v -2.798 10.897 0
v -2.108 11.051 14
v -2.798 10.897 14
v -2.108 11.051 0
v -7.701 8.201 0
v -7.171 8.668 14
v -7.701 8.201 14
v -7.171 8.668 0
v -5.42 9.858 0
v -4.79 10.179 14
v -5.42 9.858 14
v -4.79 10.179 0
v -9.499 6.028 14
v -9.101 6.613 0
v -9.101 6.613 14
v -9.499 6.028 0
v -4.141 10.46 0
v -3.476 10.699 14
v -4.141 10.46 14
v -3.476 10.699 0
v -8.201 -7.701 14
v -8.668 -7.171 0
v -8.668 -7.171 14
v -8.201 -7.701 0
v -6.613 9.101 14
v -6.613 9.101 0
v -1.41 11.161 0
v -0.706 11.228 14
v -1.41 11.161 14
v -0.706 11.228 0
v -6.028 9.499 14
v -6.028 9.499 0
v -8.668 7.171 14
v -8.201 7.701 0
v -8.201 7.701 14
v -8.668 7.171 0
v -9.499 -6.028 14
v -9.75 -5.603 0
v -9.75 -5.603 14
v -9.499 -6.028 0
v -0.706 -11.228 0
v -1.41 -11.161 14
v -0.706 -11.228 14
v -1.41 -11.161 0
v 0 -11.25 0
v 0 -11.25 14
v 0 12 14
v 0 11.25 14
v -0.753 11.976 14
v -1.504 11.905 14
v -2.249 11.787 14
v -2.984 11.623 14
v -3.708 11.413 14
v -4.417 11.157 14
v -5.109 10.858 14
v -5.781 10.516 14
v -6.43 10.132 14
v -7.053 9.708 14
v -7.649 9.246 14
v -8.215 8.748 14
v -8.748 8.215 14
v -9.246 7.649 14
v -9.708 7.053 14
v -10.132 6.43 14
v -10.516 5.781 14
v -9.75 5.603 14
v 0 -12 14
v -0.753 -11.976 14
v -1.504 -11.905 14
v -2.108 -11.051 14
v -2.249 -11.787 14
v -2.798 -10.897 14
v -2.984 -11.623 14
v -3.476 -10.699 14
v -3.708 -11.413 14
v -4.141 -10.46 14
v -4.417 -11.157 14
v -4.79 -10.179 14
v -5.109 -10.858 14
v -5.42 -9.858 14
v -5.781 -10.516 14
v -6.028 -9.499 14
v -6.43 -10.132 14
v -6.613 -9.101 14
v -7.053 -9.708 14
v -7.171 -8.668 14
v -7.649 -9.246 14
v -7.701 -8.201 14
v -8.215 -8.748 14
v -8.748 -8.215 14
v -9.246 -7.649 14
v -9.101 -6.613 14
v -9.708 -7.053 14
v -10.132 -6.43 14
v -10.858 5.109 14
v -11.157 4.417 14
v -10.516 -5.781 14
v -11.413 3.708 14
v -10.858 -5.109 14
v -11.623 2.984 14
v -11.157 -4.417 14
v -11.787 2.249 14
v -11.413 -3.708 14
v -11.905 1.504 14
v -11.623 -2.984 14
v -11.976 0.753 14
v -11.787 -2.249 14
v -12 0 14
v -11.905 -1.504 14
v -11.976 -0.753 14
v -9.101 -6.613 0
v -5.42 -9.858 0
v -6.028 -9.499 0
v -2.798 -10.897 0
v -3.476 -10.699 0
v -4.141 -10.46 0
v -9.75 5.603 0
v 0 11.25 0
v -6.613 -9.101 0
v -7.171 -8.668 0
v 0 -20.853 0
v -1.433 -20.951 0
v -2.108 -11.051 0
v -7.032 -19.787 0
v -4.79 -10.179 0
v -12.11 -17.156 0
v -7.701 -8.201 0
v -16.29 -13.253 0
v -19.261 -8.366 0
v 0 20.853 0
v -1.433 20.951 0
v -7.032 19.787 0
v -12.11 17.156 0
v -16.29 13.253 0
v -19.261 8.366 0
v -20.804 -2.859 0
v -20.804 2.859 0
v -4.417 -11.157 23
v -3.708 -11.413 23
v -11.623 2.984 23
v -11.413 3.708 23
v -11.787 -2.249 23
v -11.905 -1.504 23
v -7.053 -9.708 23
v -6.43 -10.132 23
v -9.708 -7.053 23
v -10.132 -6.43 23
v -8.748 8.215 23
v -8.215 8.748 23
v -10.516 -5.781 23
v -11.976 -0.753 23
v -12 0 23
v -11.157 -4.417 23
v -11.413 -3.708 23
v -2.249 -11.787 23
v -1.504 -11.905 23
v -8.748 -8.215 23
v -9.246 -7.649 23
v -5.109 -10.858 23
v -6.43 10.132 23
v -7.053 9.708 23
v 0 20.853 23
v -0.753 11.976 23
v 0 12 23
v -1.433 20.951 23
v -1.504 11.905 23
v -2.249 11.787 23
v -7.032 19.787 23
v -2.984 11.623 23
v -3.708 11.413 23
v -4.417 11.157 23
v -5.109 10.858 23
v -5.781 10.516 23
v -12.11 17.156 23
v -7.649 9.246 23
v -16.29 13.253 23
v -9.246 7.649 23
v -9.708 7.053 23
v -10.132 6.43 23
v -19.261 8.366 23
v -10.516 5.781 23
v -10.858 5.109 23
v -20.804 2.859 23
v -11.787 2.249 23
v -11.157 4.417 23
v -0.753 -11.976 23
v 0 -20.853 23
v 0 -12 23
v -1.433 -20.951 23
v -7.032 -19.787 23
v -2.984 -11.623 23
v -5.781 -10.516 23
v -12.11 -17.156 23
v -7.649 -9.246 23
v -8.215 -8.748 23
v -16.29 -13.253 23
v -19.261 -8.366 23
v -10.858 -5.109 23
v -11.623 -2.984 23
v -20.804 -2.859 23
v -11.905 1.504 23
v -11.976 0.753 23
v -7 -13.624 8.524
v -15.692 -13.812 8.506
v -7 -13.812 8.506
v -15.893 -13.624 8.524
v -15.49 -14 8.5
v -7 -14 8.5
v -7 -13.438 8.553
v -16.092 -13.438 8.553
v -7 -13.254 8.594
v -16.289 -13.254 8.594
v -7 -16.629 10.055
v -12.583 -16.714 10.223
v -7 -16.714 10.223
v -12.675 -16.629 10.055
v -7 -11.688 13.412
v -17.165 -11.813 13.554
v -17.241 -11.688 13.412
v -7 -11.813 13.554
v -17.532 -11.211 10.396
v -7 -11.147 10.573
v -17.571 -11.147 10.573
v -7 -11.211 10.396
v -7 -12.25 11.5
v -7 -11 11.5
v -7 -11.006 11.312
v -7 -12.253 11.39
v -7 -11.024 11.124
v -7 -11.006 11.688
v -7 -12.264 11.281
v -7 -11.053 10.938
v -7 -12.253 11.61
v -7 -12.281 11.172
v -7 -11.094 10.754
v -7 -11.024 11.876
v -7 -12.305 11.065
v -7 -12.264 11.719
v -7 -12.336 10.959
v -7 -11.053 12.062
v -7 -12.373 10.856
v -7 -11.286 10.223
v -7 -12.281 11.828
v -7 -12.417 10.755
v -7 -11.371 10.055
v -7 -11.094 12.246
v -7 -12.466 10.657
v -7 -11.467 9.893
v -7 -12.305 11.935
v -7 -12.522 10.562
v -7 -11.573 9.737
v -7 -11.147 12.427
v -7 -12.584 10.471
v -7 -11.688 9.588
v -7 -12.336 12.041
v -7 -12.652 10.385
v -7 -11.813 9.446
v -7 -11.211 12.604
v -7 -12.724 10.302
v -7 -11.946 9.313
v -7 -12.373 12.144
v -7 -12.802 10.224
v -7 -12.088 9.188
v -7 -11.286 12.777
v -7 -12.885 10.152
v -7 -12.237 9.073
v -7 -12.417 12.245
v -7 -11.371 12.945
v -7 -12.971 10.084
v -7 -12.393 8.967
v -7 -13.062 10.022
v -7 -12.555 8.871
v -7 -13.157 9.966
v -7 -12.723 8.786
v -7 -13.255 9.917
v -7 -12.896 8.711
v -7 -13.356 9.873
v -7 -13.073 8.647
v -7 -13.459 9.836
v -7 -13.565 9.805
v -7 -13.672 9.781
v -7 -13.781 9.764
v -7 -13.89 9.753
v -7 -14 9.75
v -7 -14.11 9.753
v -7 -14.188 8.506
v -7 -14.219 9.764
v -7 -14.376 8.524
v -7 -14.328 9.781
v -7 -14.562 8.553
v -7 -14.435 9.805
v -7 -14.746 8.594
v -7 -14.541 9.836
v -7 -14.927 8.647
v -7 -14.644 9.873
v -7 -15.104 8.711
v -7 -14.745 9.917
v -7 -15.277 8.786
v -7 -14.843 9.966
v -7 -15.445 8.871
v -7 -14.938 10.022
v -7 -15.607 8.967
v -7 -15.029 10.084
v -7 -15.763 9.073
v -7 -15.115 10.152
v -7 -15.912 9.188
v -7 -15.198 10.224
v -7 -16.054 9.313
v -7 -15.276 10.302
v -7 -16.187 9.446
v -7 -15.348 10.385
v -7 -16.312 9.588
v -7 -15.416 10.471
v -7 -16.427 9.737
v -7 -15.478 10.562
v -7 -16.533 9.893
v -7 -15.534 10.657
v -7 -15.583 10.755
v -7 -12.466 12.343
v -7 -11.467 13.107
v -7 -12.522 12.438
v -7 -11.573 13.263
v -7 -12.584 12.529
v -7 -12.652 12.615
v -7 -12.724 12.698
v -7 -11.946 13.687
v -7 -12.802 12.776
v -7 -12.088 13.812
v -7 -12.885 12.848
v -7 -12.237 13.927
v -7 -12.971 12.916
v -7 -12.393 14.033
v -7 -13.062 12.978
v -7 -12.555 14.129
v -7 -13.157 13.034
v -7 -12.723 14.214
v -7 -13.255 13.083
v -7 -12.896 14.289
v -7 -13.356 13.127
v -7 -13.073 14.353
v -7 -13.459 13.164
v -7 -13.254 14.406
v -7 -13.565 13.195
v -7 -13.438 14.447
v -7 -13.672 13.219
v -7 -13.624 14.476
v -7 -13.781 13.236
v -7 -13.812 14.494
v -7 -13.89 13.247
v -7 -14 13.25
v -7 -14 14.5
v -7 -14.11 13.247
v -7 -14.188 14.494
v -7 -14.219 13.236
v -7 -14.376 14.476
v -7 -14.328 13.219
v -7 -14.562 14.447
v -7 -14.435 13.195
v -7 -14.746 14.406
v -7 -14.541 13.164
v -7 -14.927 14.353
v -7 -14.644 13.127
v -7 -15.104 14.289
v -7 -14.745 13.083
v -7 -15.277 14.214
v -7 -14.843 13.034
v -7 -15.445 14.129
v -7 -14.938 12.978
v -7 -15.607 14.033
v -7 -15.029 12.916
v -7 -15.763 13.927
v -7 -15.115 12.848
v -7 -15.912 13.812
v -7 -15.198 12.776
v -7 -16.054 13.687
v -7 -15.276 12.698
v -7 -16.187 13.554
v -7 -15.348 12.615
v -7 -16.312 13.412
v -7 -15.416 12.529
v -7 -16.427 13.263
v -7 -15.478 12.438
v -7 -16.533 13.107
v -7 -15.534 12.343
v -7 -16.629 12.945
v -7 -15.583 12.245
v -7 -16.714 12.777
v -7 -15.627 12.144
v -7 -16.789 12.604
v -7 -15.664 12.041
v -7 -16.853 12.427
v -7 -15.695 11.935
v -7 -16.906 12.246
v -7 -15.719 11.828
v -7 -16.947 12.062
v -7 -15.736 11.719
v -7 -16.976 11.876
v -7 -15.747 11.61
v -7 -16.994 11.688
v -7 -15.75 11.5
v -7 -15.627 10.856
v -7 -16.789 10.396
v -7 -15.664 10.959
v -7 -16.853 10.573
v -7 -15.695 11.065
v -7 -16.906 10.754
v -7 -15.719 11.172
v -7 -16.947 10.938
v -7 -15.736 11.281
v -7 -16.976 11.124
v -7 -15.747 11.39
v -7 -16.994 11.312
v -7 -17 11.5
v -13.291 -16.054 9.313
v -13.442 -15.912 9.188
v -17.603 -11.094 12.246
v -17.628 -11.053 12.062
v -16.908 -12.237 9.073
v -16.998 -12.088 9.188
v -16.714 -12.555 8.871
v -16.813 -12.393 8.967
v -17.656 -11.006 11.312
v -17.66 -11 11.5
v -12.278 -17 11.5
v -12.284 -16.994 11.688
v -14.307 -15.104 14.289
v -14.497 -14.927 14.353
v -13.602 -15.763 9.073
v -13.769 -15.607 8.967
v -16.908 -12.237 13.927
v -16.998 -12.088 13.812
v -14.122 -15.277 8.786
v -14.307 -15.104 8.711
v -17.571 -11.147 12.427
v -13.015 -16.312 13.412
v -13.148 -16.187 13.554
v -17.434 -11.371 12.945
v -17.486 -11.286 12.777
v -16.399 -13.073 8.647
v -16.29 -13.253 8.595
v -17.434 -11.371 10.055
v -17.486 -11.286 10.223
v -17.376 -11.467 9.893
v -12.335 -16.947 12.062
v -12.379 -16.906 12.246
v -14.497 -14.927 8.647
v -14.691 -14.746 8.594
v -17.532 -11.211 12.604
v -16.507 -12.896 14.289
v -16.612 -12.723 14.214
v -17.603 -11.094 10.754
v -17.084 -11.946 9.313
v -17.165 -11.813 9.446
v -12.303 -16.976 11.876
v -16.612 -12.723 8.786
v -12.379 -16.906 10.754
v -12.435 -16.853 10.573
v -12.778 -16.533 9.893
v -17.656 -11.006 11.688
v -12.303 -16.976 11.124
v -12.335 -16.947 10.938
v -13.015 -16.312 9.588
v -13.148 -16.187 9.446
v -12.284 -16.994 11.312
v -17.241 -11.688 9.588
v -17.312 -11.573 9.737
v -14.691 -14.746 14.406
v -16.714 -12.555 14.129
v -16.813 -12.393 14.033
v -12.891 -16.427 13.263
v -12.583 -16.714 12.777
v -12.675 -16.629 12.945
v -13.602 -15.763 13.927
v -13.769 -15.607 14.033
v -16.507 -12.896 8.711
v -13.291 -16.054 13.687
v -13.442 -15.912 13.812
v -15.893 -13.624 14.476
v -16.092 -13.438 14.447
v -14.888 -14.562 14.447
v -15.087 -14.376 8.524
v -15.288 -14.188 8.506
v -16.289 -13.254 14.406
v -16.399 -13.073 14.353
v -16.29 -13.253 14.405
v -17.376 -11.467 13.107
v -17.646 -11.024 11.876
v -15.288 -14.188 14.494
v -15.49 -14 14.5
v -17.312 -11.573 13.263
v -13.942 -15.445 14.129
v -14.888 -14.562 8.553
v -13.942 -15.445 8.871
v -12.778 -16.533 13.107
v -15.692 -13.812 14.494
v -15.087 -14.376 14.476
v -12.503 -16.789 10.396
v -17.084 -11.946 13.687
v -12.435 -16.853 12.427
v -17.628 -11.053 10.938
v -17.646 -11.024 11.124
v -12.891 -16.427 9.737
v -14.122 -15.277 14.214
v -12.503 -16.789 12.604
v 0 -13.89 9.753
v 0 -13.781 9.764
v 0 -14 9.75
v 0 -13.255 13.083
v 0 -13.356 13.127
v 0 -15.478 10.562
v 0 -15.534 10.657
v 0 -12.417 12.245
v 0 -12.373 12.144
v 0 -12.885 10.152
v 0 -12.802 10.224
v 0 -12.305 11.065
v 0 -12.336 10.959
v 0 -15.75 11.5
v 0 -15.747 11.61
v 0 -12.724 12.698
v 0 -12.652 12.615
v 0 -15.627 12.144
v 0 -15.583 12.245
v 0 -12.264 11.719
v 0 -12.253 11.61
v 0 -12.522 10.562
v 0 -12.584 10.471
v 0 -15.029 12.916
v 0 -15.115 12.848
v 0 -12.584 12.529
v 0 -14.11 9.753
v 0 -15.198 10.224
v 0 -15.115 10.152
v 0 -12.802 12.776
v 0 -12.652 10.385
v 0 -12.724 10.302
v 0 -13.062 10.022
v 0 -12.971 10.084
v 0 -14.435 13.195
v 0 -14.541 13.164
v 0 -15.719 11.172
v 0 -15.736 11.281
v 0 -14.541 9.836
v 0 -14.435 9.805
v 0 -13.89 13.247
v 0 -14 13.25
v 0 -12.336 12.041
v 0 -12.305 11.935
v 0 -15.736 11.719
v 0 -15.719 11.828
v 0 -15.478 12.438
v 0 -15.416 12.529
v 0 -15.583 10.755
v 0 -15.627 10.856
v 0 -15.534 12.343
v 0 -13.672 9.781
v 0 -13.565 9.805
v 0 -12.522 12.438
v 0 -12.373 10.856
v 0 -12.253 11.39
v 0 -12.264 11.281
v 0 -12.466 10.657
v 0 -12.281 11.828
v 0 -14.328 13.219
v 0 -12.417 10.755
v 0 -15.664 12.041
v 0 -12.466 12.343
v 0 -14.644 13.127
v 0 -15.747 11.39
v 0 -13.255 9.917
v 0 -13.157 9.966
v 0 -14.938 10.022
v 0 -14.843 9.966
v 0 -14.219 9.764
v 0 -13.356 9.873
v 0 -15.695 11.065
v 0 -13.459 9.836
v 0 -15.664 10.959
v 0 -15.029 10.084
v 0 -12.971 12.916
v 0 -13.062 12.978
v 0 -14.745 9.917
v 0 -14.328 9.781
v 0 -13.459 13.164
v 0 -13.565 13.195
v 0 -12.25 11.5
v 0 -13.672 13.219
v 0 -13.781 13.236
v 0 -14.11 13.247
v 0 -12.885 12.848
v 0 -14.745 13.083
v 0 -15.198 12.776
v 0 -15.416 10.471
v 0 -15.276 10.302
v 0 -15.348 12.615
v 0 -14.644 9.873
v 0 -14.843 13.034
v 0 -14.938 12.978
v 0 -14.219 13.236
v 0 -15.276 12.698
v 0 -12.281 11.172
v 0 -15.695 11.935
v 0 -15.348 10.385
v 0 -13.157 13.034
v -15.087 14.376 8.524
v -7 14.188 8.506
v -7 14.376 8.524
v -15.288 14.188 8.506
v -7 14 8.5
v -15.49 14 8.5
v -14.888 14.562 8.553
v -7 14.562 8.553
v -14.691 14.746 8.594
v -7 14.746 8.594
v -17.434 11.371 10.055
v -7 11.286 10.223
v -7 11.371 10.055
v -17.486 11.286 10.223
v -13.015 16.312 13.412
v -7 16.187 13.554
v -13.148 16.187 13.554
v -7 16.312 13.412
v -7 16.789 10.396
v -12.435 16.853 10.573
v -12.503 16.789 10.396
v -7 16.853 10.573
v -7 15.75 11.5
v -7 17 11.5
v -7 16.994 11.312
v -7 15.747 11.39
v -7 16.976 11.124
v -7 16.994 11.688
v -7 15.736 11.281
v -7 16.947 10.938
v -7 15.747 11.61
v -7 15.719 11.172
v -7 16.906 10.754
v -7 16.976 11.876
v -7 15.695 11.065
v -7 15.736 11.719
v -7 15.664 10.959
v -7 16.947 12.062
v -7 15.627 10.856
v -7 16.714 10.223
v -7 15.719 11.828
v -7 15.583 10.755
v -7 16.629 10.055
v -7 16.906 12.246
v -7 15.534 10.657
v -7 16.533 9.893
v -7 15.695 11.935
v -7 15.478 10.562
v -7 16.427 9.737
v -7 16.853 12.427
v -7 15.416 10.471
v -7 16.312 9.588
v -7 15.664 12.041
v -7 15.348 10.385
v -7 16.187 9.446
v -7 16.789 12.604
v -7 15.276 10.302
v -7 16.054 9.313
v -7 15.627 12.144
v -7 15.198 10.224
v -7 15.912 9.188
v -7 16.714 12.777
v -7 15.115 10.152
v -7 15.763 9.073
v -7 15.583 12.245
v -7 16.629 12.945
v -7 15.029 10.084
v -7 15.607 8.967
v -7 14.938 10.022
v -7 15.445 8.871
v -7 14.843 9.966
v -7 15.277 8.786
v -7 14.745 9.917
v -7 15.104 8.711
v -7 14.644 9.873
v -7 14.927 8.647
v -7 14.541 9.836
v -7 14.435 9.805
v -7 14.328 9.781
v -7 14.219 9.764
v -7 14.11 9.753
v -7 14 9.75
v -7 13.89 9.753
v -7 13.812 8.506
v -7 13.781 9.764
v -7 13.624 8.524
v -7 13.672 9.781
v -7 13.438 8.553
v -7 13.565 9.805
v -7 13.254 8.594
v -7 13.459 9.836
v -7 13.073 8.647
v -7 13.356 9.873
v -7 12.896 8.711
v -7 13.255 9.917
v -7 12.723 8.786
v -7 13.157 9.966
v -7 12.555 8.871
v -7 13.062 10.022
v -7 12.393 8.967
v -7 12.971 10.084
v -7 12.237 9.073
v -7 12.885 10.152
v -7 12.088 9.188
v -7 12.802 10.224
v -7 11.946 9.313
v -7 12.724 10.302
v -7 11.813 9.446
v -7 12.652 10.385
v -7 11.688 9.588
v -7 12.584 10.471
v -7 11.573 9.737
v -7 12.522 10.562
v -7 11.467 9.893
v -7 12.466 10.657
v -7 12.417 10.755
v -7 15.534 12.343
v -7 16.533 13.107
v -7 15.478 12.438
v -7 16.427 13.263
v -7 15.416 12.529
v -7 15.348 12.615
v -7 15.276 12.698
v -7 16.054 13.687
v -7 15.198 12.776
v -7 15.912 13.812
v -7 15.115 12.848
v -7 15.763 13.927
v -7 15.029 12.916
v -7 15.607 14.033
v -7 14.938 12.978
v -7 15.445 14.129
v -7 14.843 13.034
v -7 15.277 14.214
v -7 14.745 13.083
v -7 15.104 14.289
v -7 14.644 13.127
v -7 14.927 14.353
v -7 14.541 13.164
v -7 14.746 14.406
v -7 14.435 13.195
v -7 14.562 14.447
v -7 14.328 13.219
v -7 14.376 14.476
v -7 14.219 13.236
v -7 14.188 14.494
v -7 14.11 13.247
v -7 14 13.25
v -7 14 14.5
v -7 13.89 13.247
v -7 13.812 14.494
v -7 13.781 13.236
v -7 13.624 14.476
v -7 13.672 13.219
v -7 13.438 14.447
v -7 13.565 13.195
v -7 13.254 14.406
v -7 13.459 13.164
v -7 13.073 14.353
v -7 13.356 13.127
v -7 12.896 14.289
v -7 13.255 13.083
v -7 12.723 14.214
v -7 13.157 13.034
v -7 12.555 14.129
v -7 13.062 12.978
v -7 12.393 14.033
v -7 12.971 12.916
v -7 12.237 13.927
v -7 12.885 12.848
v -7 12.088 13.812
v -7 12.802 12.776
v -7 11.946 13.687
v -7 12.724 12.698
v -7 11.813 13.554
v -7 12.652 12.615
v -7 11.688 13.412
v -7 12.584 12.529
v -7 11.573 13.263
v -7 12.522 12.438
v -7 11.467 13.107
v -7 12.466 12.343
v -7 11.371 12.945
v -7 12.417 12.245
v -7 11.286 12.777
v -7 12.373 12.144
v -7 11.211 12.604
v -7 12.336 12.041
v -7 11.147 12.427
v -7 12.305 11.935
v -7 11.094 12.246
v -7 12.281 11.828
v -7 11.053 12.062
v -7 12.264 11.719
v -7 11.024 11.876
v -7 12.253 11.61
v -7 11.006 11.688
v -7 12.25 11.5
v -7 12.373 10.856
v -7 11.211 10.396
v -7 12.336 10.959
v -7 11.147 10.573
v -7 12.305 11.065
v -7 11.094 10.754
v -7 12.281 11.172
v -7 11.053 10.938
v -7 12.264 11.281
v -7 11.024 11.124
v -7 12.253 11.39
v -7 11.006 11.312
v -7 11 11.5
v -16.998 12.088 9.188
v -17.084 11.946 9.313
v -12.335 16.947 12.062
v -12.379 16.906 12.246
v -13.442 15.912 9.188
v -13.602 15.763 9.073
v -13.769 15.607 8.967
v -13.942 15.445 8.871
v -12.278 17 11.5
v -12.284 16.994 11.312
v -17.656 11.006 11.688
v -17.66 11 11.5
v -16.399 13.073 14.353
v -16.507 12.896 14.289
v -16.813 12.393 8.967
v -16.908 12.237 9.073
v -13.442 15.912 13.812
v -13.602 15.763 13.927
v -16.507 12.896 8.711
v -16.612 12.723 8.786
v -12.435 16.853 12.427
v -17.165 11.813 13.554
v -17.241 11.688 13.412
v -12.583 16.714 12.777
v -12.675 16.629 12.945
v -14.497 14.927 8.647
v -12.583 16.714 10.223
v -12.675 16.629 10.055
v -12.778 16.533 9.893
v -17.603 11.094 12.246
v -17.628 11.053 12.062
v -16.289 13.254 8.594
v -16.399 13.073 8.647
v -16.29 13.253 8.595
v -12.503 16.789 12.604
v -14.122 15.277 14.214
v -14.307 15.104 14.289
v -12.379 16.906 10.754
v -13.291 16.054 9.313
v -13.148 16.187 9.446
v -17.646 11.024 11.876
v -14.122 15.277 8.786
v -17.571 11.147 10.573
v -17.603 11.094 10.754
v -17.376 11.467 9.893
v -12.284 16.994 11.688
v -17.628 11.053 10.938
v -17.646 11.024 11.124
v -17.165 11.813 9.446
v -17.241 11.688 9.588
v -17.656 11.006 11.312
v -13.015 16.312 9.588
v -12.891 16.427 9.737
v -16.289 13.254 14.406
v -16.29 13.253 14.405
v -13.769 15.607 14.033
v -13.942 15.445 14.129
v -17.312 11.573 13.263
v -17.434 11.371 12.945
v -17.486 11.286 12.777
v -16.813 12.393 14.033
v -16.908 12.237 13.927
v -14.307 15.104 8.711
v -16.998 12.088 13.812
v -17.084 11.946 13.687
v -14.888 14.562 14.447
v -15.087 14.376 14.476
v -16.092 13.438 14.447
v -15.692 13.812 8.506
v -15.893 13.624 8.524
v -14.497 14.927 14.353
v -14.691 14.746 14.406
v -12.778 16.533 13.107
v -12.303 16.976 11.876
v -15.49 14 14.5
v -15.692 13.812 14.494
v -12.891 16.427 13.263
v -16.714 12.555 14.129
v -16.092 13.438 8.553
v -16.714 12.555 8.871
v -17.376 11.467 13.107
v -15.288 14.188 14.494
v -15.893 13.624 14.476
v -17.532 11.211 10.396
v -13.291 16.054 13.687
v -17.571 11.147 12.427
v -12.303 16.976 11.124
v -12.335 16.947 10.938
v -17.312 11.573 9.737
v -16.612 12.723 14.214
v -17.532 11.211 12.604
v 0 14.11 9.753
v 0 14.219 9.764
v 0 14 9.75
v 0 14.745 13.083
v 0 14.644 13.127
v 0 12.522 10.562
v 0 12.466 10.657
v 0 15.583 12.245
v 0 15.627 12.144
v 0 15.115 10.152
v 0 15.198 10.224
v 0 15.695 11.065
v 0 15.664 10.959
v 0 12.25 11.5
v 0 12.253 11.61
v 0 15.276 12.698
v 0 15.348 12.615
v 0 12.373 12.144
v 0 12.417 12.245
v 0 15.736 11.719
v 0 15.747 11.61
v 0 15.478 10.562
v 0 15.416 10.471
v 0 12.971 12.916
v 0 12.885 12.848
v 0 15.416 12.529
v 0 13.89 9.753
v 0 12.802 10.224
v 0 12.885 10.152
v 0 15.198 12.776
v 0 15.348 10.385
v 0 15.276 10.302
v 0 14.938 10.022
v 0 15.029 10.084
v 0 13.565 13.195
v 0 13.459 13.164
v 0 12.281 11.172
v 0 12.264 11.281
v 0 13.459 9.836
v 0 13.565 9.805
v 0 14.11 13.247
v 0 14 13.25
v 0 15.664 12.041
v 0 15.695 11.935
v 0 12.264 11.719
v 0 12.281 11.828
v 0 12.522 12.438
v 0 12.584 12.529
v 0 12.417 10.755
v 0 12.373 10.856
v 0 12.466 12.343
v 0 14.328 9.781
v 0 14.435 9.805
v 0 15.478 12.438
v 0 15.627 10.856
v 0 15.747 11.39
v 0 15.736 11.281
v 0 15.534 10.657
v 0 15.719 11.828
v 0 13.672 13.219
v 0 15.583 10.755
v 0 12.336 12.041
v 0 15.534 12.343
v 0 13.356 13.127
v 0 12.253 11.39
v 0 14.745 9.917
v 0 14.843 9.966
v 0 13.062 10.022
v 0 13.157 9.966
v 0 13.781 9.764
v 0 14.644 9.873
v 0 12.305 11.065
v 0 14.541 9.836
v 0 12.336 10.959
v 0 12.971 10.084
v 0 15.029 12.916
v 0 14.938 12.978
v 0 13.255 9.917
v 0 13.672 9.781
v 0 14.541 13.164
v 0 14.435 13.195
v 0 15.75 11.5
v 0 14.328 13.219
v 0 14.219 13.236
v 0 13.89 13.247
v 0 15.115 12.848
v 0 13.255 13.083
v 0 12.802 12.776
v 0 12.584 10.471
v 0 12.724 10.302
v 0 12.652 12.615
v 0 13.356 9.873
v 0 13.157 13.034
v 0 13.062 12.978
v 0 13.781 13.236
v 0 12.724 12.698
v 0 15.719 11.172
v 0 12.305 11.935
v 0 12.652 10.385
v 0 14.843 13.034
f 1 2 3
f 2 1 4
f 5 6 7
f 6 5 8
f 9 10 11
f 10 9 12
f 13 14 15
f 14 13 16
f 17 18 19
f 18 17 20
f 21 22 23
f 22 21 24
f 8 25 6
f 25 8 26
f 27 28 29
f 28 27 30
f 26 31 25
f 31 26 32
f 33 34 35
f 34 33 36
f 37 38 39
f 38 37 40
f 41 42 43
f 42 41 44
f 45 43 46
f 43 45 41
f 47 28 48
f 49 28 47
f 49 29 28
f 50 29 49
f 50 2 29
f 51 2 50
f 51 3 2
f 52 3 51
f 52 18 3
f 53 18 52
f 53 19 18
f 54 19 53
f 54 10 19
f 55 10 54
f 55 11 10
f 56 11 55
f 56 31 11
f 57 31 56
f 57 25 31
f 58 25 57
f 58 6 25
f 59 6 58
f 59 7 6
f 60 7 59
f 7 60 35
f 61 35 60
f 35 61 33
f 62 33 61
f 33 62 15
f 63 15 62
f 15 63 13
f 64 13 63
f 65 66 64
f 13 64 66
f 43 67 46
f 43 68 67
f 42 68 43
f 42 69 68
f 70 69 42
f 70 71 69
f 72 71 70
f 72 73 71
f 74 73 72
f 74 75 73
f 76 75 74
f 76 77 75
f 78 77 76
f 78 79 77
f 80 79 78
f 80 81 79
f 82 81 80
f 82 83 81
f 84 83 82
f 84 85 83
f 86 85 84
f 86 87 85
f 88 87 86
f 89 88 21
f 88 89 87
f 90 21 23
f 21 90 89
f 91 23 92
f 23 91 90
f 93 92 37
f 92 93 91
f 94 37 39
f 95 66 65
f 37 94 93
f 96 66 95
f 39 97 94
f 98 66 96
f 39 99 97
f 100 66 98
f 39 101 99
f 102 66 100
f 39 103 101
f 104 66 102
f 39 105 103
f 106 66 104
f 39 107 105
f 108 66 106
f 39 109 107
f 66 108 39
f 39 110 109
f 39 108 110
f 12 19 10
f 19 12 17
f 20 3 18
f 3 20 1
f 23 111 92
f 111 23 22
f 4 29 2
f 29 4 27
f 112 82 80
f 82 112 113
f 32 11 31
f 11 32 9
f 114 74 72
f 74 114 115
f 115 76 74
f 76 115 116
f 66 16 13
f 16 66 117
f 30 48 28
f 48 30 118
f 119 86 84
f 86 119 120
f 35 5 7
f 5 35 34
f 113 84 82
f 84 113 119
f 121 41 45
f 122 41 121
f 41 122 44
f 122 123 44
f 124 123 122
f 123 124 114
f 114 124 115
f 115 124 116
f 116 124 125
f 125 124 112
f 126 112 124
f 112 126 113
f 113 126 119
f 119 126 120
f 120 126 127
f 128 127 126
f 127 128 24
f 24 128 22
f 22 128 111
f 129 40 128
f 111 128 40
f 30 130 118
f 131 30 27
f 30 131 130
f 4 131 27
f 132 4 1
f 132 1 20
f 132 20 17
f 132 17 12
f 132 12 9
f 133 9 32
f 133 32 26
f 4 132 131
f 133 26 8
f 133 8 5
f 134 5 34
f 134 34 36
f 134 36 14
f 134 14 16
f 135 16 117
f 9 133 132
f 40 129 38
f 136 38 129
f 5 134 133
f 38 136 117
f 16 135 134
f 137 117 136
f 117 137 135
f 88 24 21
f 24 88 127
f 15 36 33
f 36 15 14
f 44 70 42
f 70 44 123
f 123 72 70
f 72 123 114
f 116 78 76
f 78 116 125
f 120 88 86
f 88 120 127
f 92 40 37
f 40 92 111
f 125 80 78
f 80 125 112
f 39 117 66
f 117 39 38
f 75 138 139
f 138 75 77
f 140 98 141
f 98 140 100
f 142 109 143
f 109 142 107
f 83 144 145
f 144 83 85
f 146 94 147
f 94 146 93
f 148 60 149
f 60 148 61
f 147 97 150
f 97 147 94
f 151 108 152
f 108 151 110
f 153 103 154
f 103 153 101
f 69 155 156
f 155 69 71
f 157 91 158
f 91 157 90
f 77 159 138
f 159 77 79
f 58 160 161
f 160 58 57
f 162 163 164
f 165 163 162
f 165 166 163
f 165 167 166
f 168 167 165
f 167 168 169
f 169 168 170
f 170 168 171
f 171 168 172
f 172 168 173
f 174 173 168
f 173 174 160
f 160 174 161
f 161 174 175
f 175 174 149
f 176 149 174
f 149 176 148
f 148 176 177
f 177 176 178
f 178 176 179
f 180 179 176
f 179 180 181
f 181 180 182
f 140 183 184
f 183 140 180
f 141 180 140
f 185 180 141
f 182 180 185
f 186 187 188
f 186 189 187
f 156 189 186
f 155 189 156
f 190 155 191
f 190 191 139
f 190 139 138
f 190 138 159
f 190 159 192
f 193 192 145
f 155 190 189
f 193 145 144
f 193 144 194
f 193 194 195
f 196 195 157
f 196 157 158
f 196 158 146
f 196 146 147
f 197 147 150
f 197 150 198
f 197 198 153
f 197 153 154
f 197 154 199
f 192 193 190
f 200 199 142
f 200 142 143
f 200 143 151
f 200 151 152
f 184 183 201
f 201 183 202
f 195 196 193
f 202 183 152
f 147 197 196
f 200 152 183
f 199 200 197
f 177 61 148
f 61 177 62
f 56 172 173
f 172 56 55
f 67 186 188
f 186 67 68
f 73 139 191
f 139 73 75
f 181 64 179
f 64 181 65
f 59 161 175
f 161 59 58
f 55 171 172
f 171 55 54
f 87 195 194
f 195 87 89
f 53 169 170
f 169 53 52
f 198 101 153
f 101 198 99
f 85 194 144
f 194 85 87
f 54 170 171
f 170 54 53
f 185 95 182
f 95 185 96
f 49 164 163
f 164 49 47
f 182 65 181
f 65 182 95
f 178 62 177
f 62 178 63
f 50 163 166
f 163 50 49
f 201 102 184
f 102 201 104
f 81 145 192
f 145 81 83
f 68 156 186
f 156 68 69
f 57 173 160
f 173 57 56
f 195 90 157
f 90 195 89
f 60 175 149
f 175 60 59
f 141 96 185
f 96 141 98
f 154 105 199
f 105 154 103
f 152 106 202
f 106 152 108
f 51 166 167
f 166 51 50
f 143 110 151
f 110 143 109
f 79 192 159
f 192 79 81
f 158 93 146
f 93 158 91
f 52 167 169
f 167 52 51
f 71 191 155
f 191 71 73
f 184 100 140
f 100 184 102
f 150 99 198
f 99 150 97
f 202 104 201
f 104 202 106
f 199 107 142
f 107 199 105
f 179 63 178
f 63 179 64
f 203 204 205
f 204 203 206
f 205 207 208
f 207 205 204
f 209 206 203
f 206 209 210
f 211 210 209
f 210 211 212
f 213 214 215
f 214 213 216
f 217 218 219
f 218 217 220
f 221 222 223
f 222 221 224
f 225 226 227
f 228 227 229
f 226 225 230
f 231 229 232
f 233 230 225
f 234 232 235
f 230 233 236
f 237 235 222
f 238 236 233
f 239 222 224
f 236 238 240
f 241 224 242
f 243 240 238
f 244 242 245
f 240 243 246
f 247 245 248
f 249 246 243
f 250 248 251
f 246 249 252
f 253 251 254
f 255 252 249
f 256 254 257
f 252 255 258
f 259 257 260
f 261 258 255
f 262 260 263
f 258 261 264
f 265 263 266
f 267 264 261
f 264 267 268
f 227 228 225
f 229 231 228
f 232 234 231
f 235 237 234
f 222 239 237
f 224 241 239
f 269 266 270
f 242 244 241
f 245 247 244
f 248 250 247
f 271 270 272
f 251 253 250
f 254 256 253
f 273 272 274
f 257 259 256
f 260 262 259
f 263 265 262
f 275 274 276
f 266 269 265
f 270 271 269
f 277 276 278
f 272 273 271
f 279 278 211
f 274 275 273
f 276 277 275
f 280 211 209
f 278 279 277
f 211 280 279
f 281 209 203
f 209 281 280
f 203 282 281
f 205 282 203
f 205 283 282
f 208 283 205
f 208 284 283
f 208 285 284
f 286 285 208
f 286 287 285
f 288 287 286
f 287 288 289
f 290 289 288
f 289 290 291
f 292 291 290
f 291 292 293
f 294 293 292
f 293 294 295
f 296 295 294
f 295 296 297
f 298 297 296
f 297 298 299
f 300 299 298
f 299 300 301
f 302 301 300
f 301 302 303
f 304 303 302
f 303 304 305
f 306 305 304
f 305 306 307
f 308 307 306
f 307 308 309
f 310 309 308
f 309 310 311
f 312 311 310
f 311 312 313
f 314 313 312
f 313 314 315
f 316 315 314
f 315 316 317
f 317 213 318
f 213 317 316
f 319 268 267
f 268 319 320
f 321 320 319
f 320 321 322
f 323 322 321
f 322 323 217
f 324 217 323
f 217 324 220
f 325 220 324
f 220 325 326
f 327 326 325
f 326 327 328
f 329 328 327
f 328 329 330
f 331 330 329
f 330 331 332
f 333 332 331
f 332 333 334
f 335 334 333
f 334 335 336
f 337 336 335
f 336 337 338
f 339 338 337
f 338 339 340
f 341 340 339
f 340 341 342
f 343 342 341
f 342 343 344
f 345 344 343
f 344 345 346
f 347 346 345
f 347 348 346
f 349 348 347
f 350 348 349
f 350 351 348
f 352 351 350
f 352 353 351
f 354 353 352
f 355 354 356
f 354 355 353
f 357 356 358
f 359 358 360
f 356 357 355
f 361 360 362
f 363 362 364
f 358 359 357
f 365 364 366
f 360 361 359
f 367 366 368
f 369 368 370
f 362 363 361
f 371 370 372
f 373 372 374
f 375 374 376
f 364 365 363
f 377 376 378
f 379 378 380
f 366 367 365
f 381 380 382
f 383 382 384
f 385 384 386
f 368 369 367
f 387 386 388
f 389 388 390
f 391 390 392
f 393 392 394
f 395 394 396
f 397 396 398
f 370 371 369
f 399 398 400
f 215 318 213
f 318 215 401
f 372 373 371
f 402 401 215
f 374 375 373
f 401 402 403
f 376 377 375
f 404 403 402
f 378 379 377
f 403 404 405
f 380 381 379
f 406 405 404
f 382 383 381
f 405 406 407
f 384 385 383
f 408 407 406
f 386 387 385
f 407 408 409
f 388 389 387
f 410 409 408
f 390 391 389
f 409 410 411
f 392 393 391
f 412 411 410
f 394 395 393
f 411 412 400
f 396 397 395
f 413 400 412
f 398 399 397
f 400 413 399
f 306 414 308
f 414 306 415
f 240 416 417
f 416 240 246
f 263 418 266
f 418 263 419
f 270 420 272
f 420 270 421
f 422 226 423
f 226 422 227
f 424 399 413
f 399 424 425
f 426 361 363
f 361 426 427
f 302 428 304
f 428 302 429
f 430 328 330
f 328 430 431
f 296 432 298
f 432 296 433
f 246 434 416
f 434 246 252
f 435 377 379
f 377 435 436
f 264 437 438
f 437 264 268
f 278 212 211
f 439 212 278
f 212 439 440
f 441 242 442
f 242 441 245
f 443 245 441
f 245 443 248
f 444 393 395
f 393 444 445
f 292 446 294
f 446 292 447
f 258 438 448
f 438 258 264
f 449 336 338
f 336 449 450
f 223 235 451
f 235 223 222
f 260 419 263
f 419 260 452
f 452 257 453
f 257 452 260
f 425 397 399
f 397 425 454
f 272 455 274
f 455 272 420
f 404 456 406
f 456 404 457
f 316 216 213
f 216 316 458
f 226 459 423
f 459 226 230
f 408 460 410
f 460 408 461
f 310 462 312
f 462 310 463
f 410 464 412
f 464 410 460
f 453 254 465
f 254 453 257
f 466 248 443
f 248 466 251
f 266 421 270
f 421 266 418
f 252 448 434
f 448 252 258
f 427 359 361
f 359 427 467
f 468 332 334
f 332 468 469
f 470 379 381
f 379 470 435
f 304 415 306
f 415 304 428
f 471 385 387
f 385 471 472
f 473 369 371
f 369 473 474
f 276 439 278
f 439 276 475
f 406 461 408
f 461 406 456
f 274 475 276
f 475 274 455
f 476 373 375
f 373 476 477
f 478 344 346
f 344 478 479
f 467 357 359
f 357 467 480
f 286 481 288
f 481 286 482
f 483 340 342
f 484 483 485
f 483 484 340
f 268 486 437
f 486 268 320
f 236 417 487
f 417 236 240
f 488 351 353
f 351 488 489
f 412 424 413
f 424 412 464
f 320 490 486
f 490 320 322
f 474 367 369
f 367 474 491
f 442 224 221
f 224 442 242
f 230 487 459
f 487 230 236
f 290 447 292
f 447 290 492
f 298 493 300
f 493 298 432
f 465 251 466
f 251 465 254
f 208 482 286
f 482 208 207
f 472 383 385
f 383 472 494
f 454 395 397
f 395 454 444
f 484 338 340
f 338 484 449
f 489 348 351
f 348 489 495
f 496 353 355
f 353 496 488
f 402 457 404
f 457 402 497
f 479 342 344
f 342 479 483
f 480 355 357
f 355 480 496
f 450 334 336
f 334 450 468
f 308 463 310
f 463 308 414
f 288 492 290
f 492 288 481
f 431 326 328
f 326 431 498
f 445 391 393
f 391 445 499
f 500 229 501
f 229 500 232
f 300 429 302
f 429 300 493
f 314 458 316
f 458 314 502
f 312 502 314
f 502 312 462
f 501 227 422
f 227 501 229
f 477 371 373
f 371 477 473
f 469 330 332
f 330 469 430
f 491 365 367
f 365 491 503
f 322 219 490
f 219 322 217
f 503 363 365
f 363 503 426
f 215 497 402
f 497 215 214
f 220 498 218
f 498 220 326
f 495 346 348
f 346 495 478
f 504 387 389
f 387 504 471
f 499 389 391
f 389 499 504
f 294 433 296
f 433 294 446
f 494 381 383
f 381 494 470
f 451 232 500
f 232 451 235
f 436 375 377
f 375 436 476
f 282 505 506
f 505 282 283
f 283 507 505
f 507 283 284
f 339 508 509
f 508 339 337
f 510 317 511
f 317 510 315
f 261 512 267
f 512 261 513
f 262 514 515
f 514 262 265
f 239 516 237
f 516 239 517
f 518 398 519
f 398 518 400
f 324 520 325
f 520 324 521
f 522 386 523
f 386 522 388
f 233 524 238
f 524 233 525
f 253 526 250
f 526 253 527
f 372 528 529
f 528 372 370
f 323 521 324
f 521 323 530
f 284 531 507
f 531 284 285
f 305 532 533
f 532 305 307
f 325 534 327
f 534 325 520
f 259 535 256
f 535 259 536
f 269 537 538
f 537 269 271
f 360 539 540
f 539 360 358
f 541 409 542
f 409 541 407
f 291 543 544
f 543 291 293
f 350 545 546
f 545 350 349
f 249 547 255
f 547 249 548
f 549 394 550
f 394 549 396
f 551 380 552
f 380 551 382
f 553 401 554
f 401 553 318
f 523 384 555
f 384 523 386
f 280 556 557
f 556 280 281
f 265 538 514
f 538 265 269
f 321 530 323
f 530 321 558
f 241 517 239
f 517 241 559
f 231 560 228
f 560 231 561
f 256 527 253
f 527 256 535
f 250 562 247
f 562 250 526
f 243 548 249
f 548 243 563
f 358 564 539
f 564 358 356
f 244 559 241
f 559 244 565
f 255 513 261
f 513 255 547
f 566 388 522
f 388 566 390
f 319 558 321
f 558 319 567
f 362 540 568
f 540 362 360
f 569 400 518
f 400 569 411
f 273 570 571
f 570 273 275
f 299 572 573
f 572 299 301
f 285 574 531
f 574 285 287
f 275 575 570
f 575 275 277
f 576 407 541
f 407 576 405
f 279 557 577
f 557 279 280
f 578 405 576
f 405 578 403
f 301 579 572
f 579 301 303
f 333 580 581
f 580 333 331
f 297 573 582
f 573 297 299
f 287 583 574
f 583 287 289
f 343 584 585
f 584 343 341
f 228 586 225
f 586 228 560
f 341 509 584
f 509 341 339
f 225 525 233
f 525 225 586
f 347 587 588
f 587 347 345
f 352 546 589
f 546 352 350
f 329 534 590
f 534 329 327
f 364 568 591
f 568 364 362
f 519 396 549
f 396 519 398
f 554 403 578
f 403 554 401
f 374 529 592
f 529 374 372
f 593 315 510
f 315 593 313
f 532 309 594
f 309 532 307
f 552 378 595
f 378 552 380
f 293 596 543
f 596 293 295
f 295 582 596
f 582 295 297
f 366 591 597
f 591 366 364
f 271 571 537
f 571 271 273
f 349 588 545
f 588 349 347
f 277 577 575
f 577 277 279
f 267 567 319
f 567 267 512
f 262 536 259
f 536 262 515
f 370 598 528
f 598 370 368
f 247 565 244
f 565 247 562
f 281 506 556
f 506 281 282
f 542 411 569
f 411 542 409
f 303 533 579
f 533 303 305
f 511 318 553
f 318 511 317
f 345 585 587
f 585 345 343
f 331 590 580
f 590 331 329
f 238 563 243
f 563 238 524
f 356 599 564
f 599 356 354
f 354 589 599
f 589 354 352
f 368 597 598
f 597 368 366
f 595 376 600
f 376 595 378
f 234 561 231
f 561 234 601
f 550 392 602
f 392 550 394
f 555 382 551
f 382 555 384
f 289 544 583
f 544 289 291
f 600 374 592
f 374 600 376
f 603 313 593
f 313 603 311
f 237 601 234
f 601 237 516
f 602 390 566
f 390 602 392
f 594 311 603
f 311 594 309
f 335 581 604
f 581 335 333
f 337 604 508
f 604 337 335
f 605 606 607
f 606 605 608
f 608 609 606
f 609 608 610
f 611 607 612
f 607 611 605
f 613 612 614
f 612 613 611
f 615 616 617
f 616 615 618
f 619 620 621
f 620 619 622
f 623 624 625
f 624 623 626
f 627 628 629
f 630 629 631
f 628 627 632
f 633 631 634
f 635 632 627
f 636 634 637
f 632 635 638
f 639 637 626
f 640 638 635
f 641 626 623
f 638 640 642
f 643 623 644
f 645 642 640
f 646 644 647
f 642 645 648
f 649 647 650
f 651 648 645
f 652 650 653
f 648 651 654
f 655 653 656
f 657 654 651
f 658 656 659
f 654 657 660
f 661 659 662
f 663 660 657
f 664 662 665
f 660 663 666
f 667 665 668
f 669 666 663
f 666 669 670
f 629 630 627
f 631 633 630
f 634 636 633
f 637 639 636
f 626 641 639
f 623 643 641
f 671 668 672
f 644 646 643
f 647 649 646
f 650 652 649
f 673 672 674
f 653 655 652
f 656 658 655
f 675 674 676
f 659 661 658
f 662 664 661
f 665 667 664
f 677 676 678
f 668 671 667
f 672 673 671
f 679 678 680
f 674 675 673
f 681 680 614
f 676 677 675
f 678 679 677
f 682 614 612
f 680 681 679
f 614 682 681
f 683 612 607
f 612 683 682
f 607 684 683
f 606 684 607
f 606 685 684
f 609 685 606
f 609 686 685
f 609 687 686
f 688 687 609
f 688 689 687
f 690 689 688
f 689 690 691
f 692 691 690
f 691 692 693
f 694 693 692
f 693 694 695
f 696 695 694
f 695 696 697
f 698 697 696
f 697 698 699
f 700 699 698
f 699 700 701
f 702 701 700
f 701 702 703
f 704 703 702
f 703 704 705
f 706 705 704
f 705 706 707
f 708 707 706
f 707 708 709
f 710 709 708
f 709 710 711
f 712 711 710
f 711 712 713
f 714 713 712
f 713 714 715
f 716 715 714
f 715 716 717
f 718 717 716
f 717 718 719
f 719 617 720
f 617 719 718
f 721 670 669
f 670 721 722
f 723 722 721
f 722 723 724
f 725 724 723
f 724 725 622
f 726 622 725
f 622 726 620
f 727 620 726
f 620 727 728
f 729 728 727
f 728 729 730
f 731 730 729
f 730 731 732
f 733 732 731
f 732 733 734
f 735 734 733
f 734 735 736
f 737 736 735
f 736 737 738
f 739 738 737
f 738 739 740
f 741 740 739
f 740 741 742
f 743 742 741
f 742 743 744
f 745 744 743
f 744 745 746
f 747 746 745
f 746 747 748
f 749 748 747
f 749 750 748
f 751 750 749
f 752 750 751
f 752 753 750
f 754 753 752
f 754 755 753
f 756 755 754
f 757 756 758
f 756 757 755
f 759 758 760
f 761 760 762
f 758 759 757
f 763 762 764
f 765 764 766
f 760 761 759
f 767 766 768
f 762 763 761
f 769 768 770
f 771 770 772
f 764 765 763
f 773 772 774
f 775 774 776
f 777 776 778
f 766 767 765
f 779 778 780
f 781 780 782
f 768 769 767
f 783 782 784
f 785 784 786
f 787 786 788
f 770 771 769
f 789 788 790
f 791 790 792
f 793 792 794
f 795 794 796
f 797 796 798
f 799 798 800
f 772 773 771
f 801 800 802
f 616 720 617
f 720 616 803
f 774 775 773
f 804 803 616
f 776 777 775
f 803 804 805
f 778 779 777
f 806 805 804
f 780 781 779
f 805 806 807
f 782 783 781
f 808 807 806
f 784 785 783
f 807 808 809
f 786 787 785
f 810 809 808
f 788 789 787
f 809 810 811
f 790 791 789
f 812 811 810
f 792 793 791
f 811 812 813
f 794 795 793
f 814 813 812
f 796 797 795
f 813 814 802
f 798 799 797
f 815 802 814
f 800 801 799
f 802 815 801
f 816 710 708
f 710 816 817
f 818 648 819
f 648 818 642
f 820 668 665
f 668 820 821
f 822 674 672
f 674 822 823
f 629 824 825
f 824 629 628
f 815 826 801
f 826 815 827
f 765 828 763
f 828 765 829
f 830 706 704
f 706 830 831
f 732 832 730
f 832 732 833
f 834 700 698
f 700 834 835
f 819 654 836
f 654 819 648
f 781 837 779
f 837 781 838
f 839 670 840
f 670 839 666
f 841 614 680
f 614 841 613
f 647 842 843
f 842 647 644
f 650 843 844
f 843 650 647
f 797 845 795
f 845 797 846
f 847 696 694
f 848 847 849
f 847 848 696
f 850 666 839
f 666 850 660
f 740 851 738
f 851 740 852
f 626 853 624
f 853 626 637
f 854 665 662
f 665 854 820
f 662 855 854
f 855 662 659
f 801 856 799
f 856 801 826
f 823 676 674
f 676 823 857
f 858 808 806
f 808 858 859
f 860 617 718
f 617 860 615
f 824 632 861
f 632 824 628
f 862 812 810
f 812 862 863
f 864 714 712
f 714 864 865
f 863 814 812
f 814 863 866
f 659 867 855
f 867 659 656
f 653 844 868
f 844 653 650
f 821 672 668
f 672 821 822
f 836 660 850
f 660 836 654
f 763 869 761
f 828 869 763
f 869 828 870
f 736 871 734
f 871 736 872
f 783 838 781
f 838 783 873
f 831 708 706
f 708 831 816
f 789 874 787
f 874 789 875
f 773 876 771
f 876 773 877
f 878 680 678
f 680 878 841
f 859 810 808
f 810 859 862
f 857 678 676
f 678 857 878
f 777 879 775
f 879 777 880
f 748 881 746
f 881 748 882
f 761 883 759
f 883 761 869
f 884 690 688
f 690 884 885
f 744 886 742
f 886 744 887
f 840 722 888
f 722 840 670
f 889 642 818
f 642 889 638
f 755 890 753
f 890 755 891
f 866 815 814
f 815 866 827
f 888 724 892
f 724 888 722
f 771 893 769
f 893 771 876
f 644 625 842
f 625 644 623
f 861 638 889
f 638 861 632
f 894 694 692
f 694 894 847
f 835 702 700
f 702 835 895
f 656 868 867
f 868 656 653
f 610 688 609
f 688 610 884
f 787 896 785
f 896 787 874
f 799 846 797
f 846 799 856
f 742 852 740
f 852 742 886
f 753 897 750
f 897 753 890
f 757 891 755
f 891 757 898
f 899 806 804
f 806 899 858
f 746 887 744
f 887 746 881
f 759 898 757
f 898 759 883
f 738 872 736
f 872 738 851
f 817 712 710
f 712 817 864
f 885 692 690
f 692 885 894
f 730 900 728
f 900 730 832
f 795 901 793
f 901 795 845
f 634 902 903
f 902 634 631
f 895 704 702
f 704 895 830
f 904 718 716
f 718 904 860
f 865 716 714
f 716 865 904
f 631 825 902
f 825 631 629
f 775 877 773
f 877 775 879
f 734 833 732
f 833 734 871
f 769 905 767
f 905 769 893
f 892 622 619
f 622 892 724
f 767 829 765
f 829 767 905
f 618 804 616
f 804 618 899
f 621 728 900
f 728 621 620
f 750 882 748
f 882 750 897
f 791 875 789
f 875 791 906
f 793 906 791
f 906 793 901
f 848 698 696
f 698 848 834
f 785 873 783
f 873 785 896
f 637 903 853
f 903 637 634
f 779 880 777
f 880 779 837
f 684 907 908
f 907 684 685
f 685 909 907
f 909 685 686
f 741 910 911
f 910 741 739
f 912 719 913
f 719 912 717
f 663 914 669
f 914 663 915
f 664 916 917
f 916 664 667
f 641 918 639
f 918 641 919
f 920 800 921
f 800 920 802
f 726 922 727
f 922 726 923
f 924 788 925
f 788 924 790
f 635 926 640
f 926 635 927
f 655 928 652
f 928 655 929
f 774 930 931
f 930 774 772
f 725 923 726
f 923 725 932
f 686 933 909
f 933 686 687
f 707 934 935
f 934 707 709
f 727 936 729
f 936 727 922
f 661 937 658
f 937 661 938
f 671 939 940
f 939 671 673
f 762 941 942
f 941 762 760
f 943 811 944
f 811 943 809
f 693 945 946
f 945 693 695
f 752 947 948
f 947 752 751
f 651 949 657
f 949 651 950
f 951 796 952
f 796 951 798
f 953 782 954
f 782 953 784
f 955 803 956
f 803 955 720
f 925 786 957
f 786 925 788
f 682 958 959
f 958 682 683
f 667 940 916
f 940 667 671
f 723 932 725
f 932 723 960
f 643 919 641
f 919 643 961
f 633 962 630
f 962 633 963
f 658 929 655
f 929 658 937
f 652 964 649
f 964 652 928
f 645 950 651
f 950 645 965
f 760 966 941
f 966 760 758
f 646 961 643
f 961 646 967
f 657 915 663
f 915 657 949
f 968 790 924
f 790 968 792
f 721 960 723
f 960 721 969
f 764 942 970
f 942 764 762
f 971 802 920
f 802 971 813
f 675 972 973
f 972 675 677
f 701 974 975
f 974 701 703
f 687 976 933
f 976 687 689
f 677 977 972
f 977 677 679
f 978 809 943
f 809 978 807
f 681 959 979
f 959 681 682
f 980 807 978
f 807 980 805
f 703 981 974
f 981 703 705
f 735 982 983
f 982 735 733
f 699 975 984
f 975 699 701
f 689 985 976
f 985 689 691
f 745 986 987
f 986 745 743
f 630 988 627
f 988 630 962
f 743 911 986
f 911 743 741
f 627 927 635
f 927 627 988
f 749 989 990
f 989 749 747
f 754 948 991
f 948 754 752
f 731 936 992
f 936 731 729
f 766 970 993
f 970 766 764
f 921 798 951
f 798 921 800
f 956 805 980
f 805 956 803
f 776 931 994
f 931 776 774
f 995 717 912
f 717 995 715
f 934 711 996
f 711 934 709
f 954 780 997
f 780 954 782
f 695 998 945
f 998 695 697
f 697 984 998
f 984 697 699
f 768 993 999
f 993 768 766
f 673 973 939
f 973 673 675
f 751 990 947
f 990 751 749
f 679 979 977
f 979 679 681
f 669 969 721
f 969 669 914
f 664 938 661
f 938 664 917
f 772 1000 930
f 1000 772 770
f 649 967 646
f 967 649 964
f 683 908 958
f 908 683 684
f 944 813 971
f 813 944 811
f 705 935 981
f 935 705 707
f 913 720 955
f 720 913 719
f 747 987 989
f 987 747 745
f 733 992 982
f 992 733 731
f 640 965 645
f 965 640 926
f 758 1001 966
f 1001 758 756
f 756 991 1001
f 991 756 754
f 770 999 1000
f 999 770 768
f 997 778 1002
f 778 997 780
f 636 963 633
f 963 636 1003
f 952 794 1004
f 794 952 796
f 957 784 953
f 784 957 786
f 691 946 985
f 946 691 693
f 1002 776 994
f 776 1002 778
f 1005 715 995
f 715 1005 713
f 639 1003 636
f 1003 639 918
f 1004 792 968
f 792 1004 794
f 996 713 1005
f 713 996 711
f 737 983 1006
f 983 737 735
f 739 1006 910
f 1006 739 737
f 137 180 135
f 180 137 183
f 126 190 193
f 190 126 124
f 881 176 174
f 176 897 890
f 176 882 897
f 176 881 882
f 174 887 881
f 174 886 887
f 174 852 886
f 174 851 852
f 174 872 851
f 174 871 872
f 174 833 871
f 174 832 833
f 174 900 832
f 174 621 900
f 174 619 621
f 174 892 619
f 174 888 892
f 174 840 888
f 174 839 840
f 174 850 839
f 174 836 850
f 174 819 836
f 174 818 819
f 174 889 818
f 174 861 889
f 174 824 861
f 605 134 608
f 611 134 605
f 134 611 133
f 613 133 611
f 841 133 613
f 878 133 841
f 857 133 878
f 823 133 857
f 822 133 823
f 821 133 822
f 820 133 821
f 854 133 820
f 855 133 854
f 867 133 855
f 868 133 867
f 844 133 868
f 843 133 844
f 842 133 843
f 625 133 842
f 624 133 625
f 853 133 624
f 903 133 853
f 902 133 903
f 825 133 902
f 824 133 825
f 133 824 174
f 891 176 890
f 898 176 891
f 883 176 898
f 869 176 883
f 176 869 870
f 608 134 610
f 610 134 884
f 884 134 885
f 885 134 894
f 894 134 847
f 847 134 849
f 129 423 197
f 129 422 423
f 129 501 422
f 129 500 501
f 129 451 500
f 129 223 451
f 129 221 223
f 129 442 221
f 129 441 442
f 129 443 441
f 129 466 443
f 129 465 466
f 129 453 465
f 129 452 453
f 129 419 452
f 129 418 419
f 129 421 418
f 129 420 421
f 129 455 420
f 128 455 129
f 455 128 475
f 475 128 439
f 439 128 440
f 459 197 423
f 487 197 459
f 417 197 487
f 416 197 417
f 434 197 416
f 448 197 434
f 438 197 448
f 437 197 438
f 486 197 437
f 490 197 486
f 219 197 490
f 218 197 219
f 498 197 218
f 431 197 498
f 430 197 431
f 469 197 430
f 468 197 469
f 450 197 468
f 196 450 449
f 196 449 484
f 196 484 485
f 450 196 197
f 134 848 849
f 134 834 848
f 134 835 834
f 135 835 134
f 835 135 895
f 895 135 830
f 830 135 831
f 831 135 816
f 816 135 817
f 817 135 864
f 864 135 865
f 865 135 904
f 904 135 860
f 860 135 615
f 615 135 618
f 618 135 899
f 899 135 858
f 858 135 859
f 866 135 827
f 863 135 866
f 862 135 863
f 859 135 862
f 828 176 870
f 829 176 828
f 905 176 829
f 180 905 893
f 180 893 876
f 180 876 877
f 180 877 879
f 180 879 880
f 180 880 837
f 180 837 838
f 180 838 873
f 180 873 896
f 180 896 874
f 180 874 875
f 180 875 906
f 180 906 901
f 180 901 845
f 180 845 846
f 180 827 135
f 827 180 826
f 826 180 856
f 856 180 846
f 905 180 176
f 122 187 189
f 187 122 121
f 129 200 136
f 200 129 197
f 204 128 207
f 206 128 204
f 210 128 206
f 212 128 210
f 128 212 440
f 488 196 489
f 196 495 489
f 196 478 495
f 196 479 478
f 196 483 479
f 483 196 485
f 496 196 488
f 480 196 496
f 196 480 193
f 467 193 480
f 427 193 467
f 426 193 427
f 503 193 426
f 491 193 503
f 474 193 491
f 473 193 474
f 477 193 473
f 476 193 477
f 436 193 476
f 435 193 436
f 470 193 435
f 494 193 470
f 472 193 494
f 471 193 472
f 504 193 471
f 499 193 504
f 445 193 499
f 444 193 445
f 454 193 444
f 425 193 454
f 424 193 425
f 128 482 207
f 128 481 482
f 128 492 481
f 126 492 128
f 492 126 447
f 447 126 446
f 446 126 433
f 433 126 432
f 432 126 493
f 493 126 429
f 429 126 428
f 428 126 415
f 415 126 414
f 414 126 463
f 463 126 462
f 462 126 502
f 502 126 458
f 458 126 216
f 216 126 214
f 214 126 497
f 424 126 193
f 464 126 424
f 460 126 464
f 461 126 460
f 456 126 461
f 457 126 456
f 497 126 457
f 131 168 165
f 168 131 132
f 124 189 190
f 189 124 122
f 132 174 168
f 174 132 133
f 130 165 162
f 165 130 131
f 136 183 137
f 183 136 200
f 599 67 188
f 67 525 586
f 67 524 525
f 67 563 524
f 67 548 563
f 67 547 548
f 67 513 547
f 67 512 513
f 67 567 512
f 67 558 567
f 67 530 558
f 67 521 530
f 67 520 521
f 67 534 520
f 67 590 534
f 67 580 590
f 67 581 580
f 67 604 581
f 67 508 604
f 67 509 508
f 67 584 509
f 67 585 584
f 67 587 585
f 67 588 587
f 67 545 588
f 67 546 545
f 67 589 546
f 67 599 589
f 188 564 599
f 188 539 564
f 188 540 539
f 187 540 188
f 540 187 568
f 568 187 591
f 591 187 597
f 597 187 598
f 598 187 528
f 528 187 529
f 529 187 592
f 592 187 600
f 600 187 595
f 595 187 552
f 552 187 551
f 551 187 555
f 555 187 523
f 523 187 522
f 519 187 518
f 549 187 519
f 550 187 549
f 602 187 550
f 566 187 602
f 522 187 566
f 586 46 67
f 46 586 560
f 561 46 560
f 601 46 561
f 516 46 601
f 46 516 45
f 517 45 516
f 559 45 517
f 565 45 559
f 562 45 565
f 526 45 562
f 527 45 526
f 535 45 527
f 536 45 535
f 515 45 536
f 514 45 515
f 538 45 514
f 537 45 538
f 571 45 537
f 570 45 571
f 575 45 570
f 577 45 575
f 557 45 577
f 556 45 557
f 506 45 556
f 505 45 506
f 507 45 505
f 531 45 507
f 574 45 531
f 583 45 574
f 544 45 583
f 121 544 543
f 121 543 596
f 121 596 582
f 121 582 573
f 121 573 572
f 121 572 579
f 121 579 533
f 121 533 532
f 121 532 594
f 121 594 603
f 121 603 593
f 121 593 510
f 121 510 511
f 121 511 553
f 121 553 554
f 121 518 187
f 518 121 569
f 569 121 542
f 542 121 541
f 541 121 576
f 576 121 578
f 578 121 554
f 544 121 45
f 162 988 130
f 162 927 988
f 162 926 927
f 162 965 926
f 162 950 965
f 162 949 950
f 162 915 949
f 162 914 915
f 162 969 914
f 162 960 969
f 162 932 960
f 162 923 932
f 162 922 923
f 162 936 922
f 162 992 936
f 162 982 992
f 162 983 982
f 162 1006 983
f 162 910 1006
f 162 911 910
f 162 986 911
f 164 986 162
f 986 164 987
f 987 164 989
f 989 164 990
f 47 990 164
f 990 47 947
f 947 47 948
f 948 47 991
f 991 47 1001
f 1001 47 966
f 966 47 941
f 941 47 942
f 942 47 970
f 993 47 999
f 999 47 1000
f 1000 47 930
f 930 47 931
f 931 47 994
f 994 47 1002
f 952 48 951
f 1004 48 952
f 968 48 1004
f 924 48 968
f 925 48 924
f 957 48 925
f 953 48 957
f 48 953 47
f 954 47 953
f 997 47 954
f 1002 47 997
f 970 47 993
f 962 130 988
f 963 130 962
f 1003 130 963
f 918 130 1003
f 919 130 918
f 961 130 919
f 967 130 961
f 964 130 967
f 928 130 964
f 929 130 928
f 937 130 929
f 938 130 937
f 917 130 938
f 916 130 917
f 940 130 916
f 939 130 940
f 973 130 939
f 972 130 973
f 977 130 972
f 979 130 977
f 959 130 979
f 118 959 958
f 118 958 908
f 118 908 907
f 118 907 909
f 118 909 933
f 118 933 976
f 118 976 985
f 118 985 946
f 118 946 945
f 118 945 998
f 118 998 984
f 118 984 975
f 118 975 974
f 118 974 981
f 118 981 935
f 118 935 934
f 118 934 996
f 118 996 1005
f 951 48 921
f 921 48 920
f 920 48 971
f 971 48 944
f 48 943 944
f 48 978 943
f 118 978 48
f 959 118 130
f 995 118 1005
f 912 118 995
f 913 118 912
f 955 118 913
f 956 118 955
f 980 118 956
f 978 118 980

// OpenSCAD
OUTER_DIAMETER = 42;
INNER_DIAMETER = 24;
HEIGHT = 23;

SHAFT_HEIGHT = 14;
SHAFT_DIAMETER = 22.5;
SHAFT_MOUNT_WIDTH = 19.5;

MOUNTING_HOLE_DIA = 3.5;
MOUNTING_HOLE_HEAD_DIA = 6;
MOUNTING_HOLE_NUT_DIA = 7;

$fn = 100;

LEFT = false;

module grip_pos() {
    cylinder(d = OUTER_DIAMETER, h = HEIGHT, $fn = 23);
}

module grip_neg() {
    union() {
        translate([0, 0, SHAFT_HEIGHT])
        cylinder(d = INNER_DIAMETER, h = HEIGHT-SHAFT_HEIGHT);

        intersection() {
            cylinder(d = SHAFT_DIAMETER, h = SHAFT_HEIGHT);
            translate([-SHAFT_MOUNT_WIDTH/2, -SHAFT_DIAMETER/2, 0])
            cube(size = [SHAFT_MOUNT_WIDTH, SHAFT_DIAMETER, SHAFT_HEIGHT]);
        }
    }
}

module mounting_hole() {
    L = OUTER_DIAMETER;
    rotate([0, 90, 0])
    translate([0, 0, -L/2])
    union() {
        cylinder(d = MOUNTING_HOLE_HEAD_DIA, h = L/3);
        translate([0, 0, L/3])
        cylinder(d = MOUNTING_HOLE_DIA, h = L/3);
        translate([0, 0, 2*L/3])
        cylinder(d = MOUNTING_HOLE_NUT_DIA, h = L/3, $fn = 6);
    }
}

module mounting_holes() {
    union() {
        translate([0, -OUTER_DIAMETER/3, HEIGHT/2])
        mounting_hole();

        translate([0, OUTER_DIAMETER/3, HEIGHT/2])
        mounting_hole();
    }
}

intersection() {
    difference() {
        grip_pos();
        grip_neg();
        mounting_holes();
    }
    translate([LEFT ? 0 : -OUTER_DIAMETER, -OUTER_DIAMETER/2, 0])
    cube(size = [OUTER_DIAMETER, OUTER_DIAMETER, HEIGHT]);
}
